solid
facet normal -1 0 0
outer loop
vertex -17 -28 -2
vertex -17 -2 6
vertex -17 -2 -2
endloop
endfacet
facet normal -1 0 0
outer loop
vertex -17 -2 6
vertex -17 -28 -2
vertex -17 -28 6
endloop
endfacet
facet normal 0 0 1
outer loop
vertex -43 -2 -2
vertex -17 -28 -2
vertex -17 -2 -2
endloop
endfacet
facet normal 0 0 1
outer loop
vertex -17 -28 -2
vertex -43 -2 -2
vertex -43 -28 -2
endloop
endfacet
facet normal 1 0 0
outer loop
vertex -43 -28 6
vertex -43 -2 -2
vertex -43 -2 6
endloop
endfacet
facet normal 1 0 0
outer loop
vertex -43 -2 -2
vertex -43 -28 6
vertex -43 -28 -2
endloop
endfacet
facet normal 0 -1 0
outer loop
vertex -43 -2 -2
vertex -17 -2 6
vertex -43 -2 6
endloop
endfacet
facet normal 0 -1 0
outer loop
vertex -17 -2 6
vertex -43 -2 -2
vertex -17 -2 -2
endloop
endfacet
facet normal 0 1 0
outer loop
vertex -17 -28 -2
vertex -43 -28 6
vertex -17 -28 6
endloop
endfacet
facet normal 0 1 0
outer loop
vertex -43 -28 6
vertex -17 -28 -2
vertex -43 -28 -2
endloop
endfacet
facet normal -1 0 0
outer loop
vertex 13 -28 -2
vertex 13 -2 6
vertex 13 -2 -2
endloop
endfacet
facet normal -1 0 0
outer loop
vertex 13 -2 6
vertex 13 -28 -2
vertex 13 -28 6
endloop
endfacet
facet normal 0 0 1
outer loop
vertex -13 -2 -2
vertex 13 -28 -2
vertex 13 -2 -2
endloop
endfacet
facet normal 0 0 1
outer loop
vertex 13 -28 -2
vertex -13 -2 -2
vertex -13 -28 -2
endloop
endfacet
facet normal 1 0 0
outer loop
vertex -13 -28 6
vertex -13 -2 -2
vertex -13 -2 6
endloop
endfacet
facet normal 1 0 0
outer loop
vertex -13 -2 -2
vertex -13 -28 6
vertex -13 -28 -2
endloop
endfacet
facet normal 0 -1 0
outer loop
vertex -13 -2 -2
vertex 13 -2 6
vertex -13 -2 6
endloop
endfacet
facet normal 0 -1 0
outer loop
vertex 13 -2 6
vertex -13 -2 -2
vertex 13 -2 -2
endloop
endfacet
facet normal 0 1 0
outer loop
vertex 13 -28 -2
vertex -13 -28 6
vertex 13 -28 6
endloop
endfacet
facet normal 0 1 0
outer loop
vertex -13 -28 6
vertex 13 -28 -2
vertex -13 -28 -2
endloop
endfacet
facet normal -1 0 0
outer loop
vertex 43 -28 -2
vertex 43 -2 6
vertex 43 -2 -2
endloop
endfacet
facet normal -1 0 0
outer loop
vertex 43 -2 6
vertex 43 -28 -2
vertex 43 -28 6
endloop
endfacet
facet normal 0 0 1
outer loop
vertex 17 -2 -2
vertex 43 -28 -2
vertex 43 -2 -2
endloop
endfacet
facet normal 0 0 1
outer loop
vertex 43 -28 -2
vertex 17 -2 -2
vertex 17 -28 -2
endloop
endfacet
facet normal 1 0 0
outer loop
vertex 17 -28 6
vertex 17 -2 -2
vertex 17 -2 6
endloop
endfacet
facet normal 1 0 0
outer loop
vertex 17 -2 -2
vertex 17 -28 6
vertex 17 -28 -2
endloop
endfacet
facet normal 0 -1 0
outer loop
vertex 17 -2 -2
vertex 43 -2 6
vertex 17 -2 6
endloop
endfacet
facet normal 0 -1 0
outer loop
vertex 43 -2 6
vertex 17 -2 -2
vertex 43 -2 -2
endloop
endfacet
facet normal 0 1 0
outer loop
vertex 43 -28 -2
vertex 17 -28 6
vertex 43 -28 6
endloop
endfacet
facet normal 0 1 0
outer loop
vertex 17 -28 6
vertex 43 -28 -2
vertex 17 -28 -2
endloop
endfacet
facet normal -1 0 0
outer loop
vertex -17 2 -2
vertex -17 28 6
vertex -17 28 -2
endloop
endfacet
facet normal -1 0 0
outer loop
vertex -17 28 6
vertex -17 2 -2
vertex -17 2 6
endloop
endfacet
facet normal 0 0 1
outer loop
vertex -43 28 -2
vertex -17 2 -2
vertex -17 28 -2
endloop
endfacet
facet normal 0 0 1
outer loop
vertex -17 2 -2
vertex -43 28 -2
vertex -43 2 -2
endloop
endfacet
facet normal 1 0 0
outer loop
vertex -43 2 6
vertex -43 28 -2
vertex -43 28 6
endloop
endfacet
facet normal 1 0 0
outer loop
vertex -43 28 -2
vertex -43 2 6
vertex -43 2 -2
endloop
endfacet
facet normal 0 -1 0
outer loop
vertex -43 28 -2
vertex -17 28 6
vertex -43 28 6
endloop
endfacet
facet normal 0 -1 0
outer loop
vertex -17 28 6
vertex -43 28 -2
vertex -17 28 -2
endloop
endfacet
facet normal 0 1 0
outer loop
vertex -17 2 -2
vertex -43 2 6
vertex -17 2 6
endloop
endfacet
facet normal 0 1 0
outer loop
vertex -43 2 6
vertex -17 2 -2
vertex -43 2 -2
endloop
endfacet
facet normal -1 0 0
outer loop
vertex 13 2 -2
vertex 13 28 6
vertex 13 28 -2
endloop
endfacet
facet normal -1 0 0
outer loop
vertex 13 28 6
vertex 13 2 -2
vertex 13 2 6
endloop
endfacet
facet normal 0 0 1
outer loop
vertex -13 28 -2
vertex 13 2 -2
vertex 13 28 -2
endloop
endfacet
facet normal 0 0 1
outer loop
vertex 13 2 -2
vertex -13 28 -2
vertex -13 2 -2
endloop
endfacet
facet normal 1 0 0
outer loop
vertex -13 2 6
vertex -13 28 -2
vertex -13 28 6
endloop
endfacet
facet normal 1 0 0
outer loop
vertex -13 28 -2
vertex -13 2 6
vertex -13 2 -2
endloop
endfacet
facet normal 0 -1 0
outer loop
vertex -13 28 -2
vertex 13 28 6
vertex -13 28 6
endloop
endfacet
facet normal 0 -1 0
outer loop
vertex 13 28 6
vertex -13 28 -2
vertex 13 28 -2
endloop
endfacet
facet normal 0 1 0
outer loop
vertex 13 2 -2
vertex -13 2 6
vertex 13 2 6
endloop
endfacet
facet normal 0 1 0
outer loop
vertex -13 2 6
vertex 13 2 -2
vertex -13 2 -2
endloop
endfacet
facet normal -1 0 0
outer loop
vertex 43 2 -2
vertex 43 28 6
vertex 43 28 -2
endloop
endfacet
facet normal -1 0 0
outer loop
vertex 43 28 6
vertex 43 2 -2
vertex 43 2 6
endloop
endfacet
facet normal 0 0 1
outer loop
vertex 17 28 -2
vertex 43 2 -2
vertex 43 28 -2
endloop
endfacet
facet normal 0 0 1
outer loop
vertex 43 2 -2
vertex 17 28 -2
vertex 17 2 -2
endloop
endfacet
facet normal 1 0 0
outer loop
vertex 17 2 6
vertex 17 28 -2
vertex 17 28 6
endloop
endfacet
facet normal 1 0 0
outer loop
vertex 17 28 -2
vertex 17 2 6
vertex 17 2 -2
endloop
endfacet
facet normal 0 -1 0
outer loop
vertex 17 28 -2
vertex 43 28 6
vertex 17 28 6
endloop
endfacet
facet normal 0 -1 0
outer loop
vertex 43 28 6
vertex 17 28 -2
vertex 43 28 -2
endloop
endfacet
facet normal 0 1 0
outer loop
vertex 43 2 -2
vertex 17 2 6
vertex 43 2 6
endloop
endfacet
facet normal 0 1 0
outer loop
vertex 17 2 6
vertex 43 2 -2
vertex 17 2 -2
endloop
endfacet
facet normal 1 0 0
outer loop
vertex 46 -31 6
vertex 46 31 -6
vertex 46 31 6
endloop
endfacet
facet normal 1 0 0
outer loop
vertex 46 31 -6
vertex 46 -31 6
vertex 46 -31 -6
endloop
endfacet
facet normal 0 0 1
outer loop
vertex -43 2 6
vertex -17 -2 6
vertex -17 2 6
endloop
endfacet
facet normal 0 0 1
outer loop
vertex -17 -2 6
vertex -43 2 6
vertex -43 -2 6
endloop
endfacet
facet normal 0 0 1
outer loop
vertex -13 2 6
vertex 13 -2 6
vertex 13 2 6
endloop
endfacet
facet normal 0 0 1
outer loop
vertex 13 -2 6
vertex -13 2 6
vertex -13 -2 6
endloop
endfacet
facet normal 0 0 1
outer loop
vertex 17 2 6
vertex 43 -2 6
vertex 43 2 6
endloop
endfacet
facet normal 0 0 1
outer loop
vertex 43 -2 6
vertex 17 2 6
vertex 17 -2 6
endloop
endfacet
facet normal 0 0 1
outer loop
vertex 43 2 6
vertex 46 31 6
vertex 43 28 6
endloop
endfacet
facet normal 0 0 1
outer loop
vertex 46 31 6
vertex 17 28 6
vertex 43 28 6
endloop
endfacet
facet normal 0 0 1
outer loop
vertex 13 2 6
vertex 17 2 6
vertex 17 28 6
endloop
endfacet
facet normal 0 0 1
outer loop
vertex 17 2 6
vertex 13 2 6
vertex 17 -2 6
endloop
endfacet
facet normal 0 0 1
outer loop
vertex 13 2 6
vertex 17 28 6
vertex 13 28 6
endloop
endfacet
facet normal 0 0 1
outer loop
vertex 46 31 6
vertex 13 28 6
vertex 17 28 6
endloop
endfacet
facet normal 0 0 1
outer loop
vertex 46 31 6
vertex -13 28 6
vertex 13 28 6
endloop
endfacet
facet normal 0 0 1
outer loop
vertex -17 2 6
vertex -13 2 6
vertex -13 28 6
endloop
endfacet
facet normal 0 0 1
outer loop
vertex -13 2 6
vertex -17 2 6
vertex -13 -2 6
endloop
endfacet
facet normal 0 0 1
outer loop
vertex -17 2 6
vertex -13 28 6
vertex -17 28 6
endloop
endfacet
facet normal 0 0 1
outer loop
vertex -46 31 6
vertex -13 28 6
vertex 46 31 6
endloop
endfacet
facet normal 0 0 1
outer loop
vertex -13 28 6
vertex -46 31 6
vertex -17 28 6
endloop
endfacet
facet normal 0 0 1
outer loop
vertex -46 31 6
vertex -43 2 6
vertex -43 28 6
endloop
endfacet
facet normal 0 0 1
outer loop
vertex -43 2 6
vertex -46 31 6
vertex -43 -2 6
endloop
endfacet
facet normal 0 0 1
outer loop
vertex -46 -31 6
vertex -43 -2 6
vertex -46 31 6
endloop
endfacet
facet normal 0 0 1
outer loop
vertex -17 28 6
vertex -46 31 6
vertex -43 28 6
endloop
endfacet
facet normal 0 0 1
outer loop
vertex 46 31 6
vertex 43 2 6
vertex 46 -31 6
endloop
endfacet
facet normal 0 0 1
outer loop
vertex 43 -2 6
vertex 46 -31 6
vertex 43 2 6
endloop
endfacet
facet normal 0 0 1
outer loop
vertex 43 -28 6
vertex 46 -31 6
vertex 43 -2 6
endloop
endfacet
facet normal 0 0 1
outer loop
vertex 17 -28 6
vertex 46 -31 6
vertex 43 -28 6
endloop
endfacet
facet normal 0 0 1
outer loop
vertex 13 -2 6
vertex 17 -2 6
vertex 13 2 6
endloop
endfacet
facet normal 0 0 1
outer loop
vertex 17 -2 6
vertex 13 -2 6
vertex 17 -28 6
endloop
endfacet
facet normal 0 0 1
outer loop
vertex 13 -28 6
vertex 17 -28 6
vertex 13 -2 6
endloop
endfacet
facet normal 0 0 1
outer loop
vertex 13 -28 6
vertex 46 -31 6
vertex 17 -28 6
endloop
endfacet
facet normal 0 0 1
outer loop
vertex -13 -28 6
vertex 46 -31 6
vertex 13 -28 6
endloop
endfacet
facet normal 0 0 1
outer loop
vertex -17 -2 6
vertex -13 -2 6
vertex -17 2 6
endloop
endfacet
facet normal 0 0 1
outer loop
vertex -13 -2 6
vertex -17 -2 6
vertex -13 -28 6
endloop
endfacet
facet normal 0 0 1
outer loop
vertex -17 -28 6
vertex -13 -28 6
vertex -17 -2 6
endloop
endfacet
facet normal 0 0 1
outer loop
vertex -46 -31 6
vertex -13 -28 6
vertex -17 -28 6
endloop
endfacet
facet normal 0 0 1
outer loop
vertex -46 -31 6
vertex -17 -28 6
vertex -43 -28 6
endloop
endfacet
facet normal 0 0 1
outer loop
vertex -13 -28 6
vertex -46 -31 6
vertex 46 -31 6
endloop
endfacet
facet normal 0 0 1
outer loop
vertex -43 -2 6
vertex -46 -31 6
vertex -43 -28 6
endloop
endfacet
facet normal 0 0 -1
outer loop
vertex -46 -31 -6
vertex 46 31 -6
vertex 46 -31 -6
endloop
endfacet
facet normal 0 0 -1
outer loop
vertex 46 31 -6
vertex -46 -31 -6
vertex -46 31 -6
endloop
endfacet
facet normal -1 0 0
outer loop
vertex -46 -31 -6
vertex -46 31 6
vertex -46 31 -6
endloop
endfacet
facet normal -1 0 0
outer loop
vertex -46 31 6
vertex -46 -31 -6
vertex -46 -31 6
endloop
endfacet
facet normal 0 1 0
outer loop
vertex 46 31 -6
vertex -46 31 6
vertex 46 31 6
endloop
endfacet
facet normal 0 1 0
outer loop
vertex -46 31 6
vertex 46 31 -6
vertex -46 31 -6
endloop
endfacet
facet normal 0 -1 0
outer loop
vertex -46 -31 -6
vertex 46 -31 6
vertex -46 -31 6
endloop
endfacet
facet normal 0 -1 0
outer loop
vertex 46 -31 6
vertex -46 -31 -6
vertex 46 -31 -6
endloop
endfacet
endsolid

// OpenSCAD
$fn = 32;

// ----------------------------------------------------------------------
// Pocket plate 92 x 62 x 12
// 2 x 3 pockets 26 mm square, 8 mm deep
// ----------------------------------------------------------------------

// --- parameters (mm) ---
thickness = 12;  // plate thickness
floor_t = 4;     // material left under each pocket
pocket = 26;     // pocket side length
pitch_x = 30;    // pocket pitch along X
pitch_y = 30;    // pocket pitch along Y
cols = 3;        // pockets per row
rows = 2;        // rows of pockets

// --- derived feature positions (mm) ---
depth = thickness - floor_t;        // = 8   pocket depth, down to the floor
span_x = (cols - 1) * pitch_x;      // = 60   distance between outer pockets
span_y = (rows - 1) * pitch_y;      // = 30   distance between outer pocket rows
origin_x = -span_x / 2;             // = -30   X of the first pocket
origin_y = -span_y / 2;             // = -15   Y of the first pocket
plate = [span_x + pocket + 6, span_y + pocket + 6, thickness];  // = [92, 62, 12]   overall size: pockets plus 3 mm of wall on each side
feature_centers = [
  [origin_x + 0 * pitch_x, origin_y + 0 * pitch_y],
  [origin_x + 1 * pitch_x, origin_y + 0 * pitch_y],
  [origin_x + 2 * pitch_x, origin_y + 0 * pitch_y],
  [origin_x + 0 * pitch_x, origin_y + 1 * pitch_y],
  [origin_x + 1 * pitch_x, origin_y + 1 * pitch_y],
  [origin_x + 2 * pitch_x, origin_y + 1 * pitch_y]
];   // pocket centres, used verbatim by the cutter loop

// plate outline, then one pocket per centre in feature_centers
difference() {
  cube(plate, center = true);
  for (centre = feature_centers)
    translate([centre[0] - pocket / 2, centre[1] - pocket / 2, plate[2] / 2 - depth])
      cube([pocket, pocket, depth + 1]);  // centred on the declared pocket centre
}
